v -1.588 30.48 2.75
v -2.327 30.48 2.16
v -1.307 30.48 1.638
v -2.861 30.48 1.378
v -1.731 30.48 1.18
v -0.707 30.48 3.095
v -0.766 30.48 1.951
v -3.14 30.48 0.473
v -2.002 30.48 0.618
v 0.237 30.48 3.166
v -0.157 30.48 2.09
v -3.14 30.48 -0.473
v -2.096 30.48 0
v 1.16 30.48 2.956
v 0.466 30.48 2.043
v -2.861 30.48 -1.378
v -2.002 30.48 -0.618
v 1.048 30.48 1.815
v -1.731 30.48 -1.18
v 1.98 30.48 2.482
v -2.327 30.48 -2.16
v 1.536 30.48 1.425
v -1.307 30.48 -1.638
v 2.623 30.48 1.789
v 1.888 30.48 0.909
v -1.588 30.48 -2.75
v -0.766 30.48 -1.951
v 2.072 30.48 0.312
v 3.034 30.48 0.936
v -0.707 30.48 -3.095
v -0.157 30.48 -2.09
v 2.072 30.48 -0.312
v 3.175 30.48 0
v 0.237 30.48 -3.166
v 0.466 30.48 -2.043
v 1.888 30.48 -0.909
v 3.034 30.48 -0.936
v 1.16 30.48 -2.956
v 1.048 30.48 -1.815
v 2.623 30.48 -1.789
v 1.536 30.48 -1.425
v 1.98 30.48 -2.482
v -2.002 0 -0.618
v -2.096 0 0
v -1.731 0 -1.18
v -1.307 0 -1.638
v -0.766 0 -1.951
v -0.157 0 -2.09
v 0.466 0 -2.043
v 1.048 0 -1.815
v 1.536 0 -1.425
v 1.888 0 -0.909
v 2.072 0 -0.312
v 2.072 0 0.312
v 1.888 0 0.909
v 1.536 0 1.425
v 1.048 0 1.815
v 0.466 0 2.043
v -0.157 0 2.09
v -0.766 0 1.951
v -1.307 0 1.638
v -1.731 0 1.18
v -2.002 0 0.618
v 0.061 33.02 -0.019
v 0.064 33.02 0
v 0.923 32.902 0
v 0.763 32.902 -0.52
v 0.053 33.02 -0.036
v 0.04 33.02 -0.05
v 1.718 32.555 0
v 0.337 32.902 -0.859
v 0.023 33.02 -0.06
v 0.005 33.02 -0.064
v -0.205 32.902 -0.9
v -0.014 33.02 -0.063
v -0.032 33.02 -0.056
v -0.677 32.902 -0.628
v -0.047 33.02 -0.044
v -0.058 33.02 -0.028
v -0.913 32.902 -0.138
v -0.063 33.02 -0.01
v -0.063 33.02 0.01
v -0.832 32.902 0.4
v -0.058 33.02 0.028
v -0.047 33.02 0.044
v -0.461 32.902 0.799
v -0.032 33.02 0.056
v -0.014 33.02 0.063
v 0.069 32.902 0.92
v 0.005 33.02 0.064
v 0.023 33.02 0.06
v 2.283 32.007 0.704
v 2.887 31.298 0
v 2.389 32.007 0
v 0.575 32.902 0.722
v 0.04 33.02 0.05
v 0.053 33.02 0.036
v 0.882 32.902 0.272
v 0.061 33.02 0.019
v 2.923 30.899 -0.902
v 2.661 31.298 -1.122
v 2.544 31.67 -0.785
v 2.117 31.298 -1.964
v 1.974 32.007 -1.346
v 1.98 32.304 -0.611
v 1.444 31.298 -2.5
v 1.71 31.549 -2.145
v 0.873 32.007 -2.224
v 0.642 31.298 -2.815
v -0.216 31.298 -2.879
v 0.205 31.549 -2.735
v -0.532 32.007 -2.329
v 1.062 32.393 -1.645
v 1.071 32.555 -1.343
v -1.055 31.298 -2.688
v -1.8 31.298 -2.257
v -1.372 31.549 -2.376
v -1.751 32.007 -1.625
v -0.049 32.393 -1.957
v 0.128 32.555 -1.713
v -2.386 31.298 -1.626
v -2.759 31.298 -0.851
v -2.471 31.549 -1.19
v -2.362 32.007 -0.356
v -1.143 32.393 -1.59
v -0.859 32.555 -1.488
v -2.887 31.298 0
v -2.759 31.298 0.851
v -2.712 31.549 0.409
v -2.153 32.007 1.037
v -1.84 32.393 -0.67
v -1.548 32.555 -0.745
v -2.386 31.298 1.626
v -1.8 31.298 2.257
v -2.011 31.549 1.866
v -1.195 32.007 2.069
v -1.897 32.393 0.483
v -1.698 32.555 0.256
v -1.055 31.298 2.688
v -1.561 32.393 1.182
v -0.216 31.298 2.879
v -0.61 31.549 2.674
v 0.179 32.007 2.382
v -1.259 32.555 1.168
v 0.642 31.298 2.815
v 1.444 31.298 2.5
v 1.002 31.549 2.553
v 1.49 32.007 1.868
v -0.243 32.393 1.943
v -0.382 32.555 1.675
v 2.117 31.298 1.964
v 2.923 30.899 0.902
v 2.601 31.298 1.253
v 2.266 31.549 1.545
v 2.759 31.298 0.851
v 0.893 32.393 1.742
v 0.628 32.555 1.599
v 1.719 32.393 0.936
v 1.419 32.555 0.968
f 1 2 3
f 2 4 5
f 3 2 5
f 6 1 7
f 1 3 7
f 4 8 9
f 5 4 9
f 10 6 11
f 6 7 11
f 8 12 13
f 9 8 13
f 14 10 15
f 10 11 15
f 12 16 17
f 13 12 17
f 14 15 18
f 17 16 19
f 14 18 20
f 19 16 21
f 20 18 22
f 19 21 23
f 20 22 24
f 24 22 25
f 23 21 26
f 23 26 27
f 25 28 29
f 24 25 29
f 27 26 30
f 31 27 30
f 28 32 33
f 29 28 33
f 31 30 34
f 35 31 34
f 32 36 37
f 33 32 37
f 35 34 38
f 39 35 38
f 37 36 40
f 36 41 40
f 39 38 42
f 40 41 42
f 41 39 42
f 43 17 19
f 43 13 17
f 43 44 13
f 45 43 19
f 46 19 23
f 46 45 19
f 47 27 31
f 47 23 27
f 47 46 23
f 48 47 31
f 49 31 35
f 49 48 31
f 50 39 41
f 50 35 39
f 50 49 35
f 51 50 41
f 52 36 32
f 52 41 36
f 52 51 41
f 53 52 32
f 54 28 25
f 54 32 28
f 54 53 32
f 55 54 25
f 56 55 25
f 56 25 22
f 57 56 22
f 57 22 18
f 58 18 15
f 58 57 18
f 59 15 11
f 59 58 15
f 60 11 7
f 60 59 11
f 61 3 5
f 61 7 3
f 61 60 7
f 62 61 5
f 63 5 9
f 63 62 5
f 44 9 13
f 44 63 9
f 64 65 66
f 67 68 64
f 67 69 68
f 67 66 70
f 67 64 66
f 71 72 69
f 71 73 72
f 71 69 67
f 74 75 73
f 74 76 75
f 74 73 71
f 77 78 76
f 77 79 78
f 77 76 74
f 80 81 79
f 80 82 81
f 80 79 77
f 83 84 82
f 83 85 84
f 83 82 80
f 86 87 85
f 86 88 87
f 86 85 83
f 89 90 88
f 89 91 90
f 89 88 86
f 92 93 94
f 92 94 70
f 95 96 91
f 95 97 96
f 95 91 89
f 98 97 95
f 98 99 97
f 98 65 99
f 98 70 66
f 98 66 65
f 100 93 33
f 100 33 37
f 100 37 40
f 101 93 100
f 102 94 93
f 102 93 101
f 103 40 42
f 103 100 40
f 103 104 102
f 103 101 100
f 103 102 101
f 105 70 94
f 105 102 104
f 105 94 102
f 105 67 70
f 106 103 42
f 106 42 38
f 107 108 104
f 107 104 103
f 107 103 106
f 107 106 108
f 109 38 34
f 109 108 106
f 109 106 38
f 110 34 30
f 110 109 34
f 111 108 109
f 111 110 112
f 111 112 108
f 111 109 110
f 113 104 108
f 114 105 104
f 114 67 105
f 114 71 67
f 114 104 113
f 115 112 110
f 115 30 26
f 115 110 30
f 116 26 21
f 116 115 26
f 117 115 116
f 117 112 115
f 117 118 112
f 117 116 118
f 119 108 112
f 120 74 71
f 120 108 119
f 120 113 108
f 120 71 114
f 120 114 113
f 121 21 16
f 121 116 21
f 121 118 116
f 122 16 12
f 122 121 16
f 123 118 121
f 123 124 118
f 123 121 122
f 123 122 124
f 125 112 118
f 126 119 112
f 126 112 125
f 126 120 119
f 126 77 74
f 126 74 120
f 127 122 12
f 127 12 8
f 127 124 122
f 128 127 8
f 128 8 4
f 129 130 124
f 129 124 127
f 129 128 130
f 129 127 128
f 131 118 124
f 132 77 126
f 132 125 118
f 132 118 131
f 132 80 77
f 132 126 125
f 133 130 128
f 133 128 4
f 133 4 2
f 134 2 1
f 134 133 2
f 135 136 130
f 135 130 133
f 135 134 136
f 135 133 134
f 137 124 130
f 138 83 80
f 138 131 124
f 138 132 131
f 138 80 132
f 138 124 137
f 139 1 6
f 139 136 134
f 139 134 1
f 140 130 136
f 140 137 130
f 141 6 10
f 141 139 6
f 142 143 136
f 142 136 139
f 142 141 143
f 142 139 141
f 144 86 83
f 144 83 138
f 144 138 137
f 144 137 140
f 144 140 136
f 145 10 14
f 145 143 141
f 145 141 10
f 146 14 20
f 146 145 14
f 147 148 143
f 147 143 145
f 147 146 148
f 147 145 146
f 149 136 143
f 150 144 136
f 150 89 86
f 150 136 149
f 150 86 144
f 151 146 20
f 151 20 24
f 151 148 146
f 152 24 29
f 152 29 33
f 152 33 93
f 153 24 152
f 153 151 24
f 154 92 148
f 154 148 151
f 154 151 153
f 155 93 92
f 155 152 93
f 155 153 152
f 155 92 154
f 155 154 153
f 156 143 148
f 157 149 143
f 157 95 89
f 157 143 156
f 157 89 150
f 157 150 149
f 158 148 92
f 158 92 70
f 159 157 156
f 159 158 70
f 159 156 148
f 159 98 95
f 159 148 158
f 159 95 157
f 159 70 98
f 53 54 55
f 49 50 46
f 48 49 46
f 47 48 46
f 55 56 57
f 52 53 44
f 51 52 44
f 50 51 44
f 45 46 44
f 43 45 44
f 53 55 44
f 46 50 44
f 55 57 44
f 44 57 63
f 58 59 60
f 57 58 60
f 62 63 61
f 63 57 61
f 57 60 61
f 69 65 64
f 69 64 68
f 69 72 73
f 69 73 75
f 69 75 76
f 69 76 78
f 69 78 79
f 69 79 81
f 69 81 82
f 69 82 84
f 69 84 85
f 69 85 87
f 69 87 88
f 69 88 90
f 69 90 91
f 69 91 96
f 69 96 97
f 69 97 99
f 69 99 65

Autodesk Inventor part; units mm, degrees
ref_plane "YZ Plane" through (0, 0, 0) normal (1, 0, 0) x (0, 1, 0)
ref_plane "XZ Plane" through (0, 0, 0) normal (0, 1, 0) x (-1, 0, 0)
ref_plane "XY Plane" through (0, 0, 0) normal (0, 0, 1) x (1, 0, 0)
sketch "Sketch1" plane through (0, 0, 0) normal (0, 1, 0) x (-1, 0, 0)
  circle A0 centre (0, 0) radius 2.0955
  dimension "d0" = 4.191
extrude "Extrusion1" add sketch "Sketch1" along normal blind 30.48
sketch "Sketch2" plane through (0, 30.48, 0) normal (0, 1, 0) x (1, 0, 0)
  circle A0 centre (0, 0) radius 3.175
  dimension "d3" = 6.35
extrude "Extrusion2" add sketch "Sketch2" along normal blind 2.54
fillet "Fillet1" radius 3.175 1 edges at (-3.175, 33.02, 0)
thread "Thread1" size "10-24 UNC" class "2A" standard "ANSI Unified Screw Threads" full length
properties part number "0.156screw"
